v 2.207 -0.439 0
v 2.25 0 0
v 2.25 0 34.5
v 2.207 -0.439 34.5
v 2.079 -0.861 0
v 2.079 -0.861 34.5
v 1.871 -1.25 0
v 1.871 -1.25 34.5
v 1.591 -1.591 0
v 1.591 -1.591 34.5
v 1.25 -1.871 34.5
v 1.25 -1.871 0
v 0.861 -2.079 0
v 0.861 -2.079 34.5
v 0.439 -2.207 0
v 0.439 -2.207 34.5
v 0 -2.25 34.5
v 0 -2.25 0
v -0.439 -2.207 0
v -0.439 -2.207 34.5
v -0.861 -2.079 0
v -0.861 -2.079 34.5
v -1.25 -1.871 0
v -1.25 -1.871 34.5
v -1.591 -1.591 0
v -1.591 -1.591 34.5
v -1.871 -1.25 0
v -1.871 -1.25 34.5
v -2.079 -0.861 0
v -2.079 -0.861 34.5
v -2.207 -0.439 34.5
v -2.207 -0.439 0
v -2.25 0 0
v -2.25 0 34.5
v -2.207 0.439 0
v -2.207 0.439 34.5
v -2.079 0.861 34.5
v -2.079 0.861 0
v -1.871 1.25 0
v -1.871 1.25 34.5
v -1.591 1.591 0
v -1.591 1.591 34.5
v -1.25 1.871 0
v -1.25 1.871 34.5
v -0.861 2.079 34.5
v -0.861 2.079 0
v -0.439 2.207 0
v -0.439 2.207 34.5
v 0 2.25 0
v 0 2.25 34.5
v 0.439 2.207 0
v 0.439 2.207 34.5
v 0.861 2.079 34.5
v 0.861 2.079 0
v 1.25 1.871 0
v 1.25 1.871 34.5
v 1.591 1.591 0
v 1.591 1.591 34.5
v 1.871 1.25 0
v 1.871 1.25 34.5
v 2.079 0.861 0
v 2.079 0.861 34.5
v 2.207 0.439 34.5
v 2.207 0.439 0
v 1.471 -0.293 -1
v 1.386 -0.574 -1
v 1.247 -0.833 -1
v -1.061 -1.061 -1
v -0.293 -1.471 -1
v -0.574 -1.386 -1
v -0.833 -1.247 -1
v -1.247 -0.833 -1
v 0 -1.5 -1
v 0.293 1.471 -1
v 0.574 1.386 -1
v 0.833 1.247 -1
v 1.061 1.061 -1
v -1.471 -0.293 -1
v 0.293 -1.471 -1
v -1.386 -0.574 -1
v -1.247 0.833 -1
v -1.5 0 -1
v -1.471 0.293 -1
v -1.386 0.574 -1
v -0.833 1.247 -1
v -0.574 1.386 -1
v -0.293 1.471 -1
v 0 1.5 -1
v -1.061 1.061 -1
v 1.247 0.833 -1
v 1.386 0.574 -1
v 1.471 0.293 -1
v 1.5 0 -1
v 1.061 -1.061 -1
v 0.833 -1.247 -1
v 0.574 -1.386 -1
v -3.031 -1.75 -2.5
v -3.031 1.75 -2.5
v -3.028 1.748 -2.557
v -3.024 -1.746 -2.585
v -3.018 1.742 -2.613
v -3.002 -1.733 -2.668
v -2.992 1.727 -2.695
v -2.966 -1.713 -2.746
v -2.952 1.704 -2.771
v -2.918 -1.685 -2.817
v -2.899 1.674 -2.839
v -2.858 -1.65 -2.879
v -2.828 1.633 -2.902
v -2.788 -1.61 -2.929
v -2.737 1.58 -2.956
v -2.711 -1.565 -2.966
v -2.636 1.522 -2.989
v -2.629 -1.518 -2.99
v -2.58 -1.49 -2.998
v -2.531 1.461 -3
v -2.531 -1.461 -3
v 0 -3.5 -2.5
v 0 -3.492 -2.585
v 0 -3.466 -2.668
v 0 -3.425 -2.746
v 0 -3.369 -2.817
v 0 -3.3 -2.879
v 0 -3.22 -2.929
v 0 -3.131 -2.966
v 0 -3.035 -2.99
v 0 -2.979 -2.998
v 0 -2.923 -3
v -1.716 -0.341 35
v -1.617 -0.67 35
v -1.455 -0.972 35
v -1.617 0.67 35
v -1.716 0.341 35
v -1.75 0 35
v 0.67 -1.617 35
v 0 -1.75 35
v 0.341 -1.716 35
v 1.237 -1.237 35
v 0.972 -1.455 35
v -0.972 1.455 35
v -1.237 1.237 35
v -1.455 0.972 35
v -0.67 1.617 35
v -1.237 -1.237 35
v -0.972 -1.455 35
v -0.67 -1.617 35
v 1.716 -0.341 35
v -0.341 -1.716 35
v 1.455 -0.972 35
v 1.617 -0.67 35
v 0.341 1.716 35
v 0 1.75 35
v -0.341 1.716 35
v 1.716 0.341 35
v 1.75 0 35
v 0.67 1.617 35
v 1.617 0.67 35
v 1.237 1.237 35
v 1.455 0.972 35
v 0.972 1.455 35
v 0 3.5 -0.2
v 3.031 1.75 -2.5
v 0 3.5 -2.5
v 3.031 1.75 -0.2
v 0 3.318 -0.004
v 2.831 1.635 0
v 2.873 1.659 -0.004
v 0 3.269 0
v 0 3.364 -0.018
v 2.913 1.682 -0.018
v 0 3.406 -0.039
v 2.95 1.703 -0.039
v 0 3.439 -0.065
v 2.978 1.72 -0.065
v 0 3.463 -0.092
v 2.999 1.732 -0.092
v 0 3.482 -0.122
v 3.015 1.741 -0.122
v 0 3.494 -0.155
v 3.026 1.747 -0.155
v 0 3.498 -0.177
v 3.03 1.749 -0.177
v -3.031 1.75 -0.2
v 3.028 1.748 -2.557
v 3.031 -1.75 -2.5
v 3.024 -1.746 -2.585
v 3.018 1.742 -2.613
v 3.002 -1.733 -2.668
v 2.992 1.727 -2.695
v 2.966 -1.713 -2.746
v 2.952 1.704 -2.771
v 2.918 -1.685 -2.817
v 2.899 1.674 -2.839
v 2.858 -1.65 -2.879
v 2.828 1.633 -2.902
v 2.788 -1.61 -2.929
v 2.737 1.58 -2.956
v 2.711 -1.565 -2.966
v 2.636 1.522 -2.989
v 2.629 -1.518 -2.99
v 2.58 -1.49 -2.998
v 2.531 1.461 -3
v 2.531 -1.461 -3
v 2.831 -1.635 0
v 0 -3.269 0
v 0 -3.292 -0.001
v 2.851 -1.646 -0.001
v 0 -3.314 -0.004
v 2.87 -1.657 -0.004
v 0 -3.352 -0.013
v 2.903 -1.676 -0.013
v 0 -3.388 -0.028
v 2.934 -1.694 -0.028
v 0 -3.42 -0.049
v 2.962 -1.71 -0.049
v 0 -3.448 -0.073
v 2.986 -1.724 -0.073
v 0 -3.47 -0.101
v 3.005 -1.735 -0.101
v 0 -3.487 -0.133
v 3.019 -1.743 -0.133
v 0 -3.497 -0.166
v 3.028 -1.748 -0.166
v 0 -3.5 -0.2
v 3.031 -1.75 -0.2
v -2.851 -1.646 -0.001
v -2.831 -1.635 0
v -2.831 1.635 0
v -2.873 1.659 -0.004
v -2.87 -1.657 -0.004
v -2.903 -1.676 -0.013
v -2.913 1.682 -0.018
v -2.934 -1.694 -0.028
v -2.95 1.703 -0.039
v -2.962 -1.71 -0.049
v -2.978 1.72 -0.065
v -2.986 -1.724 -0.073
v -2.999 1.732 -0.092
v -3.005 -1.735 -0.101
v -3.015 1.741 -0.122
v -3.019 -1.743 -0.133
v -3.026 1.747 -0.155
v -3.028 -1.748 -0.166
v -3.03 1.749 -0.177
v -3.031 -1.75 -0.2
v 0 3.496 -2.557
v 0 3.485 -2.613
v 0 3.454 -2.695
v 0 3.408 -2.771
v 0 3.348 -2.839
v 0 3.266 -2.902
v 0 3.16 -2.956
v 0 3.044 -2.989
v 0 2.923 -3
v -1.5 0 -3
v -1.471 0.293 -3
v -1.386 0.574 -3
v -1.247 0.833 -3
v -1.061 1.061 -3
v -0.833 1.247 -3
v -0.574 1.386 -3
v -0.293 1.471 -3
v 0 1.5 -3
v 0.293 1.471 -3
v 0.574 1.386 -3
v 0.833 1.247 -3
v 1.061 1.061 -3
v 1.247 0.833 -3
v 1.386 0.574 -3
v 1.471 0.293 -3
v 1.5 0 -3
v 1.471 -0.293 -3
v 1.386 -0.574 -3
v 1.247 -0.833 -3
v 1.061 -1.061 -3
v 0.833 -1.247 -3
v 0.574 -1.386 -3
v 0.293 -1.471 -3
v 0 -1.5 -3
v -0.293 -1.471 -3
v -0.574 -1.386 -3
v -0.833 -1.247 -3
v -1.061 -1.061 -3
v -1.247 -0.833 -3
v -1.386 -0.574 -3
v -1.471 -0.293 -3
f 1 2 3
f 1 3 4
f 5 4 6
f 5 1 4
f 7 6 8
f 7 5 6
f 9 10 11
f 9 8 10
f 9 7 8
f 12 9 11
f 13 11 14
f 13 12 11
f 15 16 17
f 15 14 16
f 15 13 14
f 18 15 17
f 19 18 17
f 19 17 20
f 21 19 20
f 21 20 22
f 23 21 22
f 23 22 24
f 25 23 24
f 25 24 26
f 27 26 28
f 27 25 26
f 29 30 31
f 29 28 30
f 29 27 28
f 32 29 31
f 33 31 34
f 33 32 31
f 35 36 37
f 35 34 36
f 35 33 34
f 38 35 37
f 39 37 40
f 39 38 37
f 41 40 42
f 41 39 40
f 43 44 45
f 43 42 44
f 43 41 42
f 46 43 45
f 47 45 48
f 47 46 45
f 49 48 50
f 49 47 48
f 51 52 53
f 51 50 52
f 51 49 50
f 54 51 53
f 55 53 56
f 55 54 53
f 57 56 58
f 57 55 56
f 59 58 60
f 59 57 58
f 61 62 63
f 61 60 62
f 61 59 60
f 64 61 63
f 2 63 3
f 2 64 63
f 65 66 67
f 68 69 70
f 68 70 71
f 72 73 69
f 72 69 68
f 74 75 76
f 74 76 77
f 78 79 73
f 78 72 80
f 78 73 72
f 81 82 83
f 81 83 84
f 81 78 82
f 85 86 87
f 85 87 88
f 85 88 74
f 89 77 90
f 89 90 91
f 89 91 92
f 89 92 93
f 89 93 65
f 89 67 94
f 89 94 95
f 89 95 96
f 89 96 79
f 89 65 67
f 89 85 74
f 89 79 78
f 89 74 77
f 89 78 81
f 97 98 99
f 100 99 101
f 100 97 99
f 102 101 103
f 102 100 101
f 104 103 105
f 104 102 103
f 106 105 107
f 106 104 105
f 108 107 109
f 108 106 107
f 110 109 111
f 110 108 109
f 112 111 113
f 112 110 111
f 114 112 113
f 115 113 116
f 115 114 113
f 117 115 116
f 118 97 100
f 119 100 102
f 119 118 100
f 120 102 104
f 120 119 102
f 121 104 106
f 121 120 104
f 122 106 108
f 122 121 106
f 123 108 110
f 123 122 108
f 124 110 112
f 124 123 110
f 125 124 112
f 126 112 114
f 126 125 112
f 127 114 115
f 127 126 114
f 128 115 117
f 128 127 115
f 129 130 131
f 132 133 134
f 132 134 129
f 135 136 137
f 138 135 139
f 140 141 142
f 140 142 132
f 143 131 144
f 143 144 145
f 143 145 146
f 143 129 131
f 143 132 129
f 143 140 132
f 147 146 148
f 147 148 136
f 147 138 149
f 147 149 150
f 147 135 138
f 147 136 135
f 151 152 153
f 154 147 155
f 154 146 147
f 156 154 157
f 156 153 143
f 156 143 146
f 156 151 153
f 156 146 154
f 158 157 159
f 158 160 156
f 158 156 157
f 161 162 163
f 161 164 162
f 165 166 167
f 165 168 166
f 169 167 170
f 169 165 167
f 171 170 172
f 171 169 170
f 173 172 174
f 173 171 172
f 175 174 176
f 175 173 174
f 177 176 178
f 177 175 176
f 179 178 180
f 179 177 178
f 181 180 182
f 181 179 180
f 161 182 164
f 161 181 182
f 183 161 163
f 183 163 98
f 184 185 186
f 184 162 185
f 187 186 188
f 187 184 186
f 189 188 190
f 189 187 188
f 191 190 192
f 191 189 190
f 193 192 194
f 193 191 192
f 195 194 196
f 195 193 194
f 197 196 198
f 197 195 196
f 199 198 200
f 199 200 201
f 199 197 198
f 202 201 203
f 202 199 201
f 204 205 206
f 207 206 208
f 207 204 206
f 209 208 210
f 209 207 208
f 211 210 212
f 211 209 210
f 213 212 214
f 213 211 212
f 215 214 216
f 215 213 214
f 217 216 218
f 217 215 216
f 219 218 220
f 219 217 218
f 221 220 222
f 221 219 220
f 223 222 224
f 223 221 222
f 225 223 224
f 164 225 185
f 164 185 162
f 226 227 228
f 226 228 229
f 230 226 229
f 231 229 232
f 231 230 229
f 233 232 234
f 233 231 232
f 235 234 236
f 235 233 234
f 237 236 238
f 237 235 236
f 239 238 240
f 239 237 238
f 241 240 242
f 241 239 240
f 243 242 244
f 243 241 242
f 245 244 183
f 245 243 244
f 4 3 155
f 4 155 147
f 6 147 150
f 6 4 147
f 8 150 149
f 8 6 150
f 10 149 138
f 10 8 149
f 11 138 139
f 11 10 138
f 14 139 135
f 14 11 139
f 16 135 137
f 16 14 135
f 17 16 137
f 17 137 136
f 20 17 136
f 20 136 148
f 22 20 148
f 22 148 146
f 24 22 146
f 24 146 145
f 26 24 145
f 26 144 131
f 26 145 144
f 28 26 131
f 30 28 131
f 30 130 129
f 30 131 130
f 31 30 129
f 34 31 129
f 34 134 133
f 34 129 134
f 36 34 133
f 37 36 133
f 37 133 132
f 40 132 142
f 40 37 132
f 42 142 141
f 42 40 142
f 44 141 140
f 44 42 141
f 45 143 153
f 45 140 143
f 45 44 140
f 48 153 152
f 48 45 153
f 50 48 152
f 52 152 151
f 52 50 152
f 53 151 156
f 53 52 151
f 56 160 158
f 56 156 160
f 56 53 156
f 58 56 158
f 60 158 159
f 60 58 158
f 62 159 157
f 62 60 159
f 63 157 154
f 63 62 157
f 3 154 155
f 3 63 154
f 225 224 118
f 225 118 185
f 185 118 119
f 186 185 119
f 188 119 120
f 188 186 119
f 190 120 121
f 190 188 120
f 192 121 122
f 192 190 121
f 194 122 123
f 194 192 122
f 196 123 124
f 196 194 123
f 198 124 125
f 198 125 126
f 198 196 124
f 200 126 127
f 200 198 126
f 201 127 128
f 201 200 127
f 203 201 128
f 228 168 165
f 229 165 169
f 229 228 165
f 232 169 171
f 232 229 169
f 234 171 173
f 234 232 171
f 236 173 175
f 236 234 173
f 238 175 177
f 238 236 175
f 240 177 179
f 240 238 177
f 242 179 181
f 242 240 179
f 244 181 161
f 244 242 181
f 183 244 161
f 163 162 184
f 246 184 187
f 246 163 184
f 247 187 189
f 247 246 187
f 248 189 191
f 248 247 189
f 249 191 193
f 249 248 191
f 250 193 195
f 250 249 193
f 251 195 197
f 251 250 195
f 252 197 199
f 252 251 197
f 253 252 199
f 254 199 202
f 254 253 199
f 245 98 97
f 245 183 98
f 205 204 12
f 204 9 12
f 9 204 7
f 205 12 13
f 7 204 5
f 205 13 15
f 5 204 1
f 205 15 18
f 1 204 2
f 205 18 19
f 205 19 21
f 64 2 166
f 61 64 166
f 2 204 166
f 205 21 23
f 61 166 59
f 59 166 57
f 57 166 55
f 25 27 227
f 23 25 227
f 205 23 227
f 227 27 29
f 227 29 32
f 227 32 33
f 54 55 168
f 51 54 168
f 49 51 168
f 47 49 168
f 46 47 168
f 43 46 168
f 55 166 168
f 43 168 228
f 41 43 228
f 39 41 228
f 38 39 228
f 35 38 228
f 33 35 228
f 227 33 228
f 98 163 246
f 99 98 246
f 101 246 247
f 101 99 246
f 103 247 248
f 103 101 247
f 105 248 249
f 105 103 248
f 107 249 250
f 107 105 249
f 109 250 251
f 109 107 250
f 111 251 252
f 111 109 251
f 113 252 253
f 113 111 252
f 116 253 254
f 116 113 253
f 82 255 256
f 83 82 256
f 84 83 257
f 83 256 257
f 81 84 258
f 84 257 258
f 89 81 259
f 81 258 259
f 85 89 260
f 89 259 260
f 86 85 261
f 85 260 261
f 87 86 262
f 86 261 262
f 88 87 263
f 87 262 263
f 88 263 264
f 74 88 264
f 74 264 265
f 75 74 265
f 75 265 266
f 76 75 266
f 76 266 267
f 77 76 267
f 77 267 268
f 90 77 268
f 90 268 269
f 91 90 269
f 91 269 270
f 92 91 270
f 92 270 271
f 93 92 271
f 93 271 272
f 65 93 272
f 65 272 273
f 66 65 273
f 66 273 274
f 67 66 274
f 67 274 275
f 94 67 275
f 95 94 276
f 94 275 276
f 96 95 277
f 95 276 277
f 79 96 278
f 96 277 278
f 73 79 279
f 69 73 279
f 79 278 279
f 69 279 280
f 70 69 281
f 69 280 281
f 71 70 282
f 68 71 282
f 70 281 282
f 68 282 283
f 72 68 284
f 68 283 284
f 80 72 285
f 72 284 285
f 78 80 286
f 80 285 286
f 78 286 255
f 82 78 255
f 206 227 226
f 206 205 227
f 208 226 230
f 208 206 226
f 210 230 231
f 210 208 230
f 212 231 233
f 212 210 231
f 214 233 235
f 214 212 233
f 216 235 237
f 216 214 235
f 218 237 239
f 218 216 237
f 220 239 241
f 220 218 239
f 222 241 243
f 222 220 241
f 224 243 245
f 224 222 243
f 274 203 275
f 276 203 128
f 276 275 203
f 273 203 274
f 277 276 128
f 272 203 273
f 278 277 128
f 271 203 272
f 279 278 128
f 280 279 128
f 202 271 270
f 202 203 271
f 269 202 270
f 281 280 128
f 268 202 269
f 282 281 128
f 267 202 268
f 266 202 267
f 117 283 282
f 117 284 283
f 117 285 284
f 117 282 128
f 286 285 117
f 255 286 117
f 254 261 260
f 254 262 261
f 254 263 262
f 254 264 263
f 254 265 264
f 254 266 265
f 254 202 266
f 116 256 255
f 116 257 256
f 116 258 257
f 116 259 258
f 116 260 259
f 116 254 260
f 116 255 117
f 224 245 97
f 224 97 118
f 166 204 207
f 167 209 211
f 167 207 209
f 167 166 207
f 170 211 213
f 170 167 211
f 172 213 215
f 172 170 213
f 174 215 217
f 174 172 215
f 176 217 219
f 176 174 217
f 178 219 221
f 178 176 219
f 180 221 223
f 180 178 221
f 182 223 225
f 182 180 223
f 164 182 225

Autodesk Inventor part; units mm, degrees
ref_plane "YZ Plane" through (0, 0, 0) normal (1, 0, 0) x (0, 1, 0)
ref_plane "XZ Plane" through (0, 0, 0) normal (0, 1, 0) x (-1, 0, 0)
ref_plane "XY Plane" through (0, 0, 0) normal (0, 0, 1) x (1, 0, 0)
sketch "草图1" plane through (0, 0, 0) normal (0, 0, 1) x (1, 0, 0)
  circle A0 centre (0, 0) radius 2.25
  dimension "d0" = 4.5
extrude "拉伸1" add sketch "草图1" along normal blind 35
thread "螺纹1" size "M4.5x0.75" class "6g" standard "ANSI Metric M Profile" full length
sketch "草图4" plane through (0, 0, 0) normal (0, 0, -1) x (-1, 0, 0)
  line L0 (0, -3.5) -> (-3.0311, -1.75)
  line L1 (-3.0311, -1.75) -> (-3.0311, 1.75)
  line L2 (-3.0311, 1.75) -> (0, 3.5)
  line L3 (0, 3.5) -> (3.0311, 1.75)
  line L4 (3.0311, 1.75) -> (3.0311, -1.75)
  line L5 (3.0311, -1.75) -> (0, -3.5)
  point P0 (0, 0)
  point P1 (0, 0)
sketch "草图5" plane through (0, 0, 0) normal (0, 0, -1) x (-1, 0, 0)
  point P0 (0, 0)
extrude "拉伸4" add sketch "草图4" along normal blind 3
fillet "圆角3" radius 0.5 6 edges at (-1.5155, -2.625, -3) (-3.0311, 0, -3) (-1.5155, 2.625, -3) (1.5155, 2.625, -3) (3.0311, 0, -3) (1.5155, -2.625, -3)
fillet "圆角4" radius 0.2 6 edges at (1.5155, -2.625, 0) (3.0311, 0, 0) (1.5155, 2.625, 0) (-1.5155, -2.625, 0) (-1.5155, 2.625, 0) (-3.0311, 0, 0)
sketch "草图6" plane through (0, 0, -3) normal (0, 0, -1) x (-1, 0, 0)
  circle A0 centre (0, 0) radius 1.5
  dimension "d20" = 3
extrude "拉伸5" cut sketch "草图6" against normal blind 2
chamfer "倒角1" distance 0.5 angle 45 1 edges at (-2.25, 0, 35)
equation "\"折弯半径\" = 厚度"
equation "\"折弯释压宽度\" = 厚度"
equation "\"折弯释压深度\" = 0.5 * 厚度"
equation "\"拐角释压尺寸\" = 4 * 厚度"
equation "\"最小余量\" = 2 * 厚度"
equation "\"过渡半径\" = 折弯半径"
equation "\"Jacobi半径尺寸\" = 折弯半径"
equation "\"间隙大小\" = 厚度"
equation "\"厚度\" = 0.5"
